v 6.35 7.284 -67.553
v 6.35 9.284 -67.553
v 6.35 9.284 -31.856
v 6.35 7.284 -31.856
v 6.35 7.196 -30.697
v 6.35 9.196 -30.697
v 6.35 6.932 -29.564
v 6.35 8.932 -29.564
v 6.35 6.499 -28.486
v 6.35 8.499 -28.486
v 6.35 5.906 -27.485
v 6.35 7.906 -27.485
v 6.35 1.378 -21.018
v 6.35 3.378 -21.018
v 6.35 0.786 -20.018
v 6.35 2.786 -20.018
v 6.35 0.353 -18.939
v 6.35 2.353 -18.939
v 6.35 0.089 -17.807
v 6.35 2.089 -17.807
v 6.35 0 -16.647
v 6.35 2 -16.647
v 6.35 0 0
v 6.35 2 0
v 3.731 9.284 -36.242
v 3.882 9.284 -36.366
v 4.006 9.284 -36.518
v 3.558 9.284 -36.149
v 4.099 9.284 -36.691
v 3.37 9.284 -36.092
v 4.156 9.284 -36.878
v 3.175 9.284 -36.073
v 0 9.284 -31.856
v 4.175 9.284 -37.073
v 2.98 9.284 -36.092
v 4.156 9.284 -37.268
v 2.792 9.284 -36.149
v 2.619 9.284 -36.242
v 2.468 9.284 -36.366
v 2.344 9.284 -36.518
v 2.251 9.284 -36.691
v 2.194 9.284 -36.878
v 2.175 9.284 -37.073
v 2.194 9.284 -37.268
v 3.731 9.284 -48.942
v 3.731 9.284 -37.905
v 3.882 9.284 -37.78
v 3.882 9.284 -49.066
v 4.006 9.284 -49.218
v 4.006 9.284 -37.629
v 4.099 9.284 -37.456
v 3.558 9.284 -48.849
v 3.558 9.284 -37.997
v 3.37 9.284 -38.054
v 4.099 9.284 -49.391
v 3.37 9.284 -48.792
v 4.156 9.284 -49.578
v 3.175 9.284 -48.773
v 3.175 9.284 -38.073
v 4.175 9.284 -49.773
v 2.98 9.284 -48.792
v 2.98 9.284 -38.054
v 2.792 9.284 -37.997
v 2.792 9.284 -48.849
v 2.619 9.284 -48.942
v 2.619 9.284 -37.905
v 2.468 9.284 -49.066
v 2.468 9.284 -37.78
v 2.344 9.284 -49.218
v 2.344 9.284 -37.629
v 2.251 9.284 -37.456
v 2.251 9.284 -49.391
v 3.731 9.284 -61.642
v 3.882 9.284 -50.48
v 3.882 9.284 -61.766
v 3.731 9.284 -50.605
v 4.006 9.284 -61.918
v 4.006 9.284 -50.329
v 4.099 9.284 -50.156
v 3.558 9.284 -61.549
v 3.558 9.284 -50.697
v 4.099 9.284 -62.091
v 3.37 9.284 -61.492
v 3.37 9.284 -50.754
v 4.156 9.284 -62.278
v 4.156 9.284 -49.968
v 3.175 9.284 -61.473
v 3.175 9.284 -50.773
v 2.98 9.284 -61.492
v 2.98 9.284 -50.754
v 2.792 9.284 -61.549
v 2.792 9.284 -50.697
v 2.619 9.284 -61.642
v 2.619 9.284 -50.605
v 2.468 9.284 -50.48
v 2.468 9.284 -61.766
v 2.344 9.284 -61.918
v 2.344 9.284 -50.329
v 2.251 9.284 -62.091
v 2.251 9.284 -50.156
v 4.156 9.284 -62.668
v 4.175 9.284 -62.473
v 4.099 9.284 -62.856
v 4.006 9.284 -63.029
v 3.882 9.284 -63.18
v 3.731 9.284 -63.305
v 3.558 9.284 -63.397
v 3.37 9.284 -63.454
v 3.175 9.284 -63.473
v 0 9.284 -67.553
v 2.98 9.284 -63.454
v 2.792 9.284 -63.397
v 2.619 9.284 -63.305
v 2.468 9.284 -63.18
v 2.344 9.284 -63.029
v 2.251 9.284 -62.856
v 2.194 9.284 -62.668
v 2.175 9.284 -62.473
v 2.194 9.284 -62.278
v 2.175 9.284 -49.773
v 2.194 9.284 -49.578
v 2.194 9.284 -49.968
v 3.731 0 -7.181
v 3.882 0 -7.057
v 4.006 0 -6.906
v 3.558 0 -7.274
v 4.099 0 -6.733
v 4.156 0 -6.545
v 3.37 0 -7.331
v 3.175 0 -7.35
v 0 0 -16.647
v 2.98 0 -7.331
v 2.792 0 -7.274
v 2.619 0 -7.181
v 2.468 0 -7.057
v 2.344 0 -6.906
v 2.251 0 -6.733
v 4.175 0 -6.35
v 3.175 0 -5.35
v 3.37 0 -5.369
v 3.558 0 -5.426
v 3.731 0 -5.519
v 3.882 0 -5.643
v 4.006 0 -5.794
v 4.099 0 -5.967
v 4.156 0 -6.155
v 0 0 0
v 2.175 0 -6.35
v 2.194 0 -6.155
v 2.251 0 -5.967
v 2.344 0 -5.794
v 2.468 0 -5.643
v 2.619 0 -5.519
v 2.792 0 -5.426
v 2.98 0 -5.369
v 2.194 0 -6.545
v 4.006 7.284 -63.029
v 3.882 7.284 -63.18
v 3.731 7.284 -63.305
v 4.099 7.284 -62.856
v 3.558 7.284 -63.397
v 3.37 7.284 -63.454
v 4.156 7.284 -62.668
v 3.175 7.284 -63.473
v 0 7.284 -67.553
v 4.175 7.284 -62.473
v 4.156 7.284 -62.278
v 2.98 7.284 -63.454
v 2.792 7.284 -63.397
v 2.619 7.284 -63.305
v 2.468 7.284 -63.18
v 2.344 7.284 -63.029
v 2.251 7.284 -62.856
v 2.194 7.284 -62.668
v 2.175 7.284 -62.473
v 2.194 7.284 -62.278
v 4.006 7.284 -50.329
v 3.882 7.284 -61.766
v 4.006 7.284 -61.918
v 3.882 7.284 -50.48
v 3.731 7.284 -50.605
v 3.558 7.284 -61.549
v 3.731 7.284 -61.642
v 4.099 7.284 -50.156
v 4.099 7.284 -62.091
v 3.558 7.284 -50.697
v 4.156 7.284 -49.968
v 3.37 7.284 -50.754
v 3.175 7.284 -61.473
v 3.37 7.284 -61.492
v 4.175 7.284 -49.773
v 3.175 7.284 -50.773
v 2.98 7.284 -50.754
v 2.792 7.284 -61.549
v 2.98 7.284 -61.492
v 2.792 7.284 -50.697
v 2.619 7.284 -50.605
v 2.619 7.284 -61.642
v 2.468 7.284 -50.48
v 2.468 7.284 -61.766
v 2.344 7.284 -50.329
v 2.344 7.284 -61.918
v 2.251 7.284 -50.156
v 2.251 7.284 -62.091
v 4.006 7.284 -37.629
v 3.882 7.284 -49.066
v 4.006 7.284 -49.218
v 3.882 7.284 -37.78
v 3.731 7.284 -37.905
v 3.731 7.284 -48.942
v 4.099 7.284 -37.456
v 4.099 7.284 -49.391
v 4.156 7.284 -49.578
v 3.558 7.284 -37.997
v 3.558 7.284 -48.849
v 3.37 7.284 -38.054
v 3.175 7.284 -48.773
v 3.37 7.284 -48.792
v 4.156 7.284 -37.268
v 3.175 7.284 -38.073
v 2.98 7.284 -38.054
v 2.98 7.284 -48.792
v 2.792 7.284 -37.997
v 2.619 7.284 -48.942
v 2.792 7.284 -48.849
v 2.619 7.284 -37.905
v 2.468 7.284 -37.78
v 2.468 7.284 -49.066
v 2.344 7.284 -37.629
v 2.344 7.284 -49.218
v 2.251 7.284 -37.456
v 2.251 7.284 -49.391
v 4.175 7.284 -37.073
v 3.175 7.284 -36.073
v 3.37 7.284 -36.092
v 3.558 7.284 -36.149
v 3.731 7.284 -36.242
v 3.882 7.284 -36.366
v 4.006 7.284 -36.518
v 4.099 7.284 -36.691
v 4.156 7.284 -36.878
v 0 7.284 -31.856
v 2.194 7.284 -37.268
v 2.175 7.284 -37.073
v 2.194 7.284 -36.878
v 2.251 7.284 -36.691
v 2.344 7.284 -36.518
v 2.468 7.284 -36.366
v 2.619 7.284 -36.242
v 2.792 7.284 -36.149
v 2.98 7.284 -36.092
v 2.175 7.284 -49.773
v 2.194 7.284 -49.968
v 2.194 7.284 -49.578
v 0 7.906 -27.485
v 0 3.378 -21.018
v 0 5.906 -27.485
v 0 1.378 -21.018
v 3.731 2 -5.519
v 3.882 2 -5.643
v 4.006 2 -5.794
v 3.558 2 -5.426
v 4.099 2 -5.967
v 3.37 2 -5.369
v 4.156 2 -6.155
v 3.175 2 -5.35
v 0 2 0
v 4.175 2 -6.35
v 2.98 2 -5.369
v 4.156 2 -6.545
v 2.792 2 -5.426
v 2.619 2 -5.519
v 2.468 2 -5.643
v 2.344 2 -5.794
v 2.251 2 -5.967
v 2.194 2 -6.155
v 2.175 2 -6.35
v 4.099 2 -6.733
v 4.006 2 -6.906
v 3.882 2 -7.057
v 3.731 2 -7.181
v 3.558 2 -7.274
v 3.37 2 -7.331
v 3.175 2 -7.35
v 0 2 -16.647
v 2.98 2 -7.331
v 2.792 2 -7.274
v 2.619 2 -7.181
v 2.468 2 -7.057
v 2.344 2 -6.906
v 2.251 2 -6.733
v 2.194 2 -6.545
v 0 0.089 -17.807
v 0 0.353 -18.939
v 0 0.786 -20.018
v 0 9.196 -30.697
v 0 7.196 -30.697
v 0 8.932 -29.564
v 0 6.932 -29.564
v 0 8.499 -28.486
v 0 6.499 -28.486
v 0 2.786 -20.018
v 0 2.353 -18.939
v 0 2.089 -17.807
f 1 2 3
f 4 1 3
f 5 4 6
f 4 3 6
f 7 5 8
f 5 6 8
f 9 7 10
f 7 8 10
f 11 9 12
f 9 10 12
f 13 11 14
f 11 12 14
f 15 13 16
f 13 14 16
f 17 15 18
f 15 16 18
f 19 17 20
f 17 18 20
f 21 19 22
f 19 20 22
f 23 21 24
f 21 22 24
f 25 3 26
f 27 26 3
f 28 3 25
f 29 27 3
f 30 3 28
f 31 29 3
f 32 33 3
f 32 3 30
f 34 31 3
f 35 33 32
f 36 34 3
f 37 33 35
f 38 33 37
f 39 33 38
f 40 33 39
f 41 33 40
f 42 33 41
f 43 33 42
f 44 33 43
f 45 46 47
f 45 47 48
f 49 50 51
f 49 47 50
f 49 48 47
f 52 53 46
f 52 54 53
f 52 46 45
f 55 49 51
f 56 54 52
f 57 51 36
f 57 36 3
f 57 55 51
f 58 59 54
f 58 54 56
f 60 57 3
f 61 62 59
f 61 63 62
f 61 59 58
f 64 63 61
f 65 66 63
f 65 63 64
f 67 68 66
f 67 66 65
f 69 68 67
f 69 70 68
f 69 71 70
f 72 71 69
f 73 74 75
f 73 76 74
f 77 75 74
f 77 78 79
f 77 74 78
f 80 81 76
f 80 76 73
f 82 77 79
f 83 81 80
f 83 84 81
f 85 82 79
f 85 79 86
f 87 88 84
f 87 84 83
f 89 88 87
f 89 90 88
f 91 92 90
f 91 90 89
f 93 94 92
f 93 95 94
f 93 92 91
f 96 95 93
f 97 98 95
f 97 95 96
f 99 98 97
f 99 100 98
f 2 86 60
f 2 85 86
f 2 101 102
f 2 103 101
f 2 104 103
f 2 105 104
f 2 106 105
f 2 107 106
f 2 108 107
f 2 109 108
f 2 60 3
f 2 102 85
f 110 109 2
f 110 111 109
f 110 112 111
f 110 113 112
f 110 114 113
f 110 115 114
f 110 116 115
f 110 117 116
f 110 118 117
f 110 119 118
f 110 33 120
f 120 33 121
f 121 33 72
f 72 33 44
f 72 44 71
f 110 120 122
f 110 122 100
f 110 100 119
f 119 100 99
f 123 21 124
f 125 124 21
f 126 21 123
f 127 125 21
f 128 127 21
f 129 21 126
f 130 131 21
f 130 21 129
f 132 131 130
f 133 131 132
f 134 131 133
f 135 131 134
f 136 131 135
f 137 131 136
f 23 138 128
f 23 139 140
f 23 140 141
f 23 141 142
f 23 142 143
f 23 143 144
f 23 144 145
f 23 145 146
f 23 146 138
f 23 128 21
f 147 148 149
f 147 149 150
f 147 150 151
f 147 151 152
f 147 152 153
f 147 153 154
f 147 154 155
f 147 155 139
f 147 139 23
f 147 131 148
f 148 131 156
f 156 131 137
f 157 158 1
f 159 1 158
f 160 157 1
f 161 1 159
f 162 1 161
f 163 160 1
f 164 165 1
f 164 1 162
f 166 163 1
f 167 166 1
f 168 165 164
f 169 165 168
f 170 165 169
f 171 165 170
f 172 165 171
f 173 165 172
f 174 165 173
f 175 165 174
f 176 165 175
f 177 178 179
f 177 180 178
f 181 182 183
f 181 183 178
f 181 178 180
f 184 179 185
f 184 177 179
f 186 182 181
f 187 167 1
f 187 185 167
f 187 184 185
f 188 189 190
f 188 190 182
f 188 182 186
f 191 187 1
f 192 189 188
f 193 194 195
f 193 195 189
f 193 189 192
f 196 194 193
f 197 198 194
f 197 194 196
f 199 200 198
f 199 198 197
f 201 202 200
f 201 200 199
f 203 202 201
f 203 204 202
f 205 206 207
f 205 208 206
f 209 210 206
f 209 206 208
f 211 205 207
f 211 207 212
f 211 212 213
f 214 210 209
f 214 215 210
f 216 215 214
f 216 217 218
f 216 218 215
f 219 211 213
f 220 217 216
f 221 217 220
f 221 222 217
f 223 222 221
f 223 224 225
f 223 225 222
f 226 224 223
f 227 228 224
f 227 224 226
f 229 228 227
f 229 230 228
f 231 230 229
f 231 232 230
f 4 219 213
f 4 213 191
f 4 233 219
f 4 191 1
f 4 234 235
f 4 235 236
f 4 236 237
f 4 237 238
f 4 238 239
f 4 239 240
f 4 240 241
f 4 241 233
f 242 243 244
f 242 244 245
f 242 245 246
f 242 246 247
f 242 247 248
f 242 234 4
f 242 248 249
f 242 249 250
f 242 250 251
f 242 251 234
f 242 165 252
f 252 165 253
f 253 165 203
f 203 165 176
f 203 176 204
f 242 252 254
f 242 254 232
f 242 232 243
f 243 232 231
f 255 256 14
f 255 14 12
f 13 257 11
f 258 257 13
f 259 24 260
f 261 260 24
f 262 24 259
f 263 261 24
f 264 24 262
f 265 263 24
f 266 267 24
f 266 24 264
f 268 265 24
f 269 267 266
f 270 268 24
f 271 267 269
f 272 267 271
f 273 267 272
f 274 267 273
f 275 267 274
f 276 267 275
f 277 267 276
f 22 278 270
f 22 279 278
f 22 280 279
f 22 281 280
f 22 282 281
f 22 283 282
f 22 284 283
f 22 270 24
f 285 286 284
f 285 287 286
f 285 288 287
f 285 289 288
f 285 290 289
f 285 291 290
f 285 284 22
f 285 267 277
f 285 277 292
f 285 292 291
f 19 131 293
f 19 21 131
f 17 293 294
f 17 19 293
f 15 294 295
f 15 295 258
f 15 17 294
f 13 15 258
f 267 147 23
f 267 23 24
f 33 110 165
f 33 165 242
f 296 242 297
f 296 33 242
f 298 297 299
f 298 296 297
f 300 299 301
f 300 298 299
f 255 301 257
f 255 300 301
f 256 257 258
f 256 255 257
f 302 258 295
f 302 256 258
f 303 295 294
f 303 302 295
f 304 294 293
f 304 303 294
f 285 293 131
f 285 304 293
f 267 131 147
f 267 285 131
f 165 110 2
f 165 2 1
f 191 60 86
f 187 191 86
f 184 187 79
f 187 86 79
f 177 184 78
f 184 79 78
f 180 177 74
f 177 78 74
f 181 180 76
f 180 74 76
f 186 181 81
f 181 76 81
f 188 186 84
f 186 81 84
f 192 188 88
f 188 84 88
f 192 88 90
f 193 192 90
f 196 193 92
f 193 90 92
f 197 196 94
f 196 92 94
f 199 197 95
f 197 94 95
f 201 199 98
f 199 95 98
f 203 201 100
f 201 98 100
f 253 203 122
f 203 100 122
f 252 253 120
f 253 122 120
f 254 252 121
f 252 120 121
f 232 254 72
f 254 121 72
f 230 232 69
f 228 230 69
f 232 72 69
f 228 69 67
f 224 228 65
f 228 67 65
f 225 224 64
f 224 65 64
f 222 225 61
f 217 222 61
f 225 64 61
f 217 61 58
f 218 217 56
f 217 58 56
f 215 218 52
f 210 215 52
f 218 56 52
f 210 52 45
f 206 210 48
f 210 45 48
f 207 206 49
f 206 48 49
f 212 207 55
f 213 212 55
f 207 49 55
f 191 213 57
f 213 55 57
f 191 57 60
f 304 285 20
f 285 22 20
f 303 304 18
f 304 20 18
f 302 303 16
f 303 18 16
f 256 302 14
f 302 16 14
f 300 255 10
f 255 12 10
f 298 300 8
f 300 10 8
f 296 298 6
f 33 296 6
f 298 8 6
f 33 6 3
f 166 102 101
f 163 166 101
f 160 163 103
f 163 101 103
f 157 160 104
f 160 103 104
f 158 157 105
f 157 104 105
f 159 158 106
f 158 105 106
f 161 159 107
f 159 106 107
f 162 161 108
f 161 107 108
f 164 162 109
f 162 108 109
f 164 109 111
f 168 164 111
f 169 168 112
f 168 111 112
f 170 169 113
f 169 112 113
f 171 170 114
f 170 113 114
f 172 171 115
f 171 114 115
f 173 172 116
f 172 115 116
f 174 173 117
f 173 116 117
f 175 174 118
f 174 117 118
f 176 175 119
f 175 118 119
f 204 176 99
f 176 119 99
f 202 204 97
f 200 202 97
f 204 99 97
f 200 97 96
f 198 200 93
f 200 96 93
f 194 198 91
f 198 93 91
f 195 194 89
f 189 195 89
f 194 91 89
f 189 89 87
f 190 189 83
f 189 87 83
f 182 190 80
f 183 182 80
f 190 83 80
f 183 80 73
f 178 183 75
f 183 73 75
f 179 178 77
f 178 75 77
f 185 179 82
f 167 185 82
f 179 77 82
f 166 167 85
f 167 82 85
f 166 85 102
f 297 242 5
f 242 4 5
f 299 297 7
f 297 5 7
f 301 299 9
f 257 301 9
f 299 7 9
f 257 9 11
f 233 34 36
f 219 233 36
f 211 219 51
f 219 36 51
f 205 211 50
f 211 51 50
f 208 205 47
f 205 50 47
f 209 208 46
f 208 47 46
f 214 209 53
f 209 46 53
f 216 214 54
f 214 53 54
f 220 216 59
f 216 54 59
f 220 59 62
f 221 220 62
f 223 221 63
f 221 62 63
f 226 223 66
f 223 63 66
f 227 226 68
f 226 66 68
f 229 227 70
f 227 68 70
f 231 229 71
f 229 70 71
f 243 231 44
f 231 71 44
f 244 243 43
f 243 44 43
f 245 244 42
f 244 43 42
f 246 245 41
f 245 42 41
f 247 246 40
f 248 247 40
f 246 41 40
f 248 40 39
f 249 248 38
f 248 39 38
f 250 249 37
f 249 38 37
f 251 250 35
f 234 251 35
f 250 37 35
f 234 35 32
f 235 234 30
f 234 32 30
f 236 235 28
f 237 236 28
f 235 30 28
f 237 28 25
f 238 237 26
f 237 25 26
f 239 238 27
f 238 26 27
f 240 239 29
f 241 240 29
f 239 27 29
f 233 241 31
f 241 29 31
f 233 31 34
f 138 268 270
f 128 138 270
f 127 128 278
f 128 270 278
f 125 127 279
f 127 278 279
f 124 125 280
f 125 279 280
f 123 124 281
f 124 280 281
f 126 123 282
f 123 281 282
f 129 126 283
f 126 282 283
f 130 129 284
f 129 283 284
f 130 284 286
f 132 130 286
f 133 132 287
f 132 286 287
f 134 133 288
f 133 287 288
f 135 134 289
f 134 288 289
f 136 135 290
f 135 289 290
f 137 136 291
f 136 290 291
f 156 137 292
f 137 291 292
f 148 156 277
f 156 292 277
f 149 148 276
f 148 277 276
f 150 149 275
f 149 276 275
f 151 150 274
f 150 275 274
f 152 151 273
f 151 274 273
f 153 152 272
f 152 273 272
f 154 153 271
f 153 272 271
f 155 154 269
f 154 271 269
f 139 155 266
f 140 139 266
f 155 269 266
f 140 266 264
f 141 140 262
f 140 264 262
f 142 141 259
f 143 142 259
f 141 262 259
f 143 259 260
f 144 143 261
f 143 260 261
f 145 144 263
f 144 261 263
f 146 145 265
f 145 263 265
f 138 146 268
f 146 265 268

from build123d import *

# Parameters (mm, degrees)
BOSS_EXTRUDE1_DEPTH = 6.35
SKETCH2_R           = 1
CUT_EXTRUDE1_DEPTH  = 2
SKETCH3_R           = 1
CUT_EXTRUDE2_DEPTH  = 2
LPATTERN1_COUNT     = 3
LPATTERN1_PITCH     = 12.7
FILLET1_R           = 7.62


with BuildPart() as part:
    # Sketch1 → Boss-Extrude1 (new body)
    with BuildSketch(Plane(origin=(0, 0, 0), x_dir=(0, 0, -1), z_dir=(1, 0, 0))):
        Polygon((0, 2), (19.05, 2), (29.453230962, 9.284420742), (67.553230962, 9.284420742), (67.553230962, 7.284420742), (29.453230962, 7.284420742), (19.05, 0), (0, 0), align=None)
    extrude(amount=BOSS_EXTRUDE1_DEPTH)

    # Sketch2 → Cut-Extrude1 (cut)
    with BuildSketch(Plane(origin=(0, 2, 0), x_dir=(1, 0, 0), z_dir=(0, 1, 0))):
        with Locations((3.175, 6.35)):
            Circle(SKETCH2_R)
    extrude(amount=-CUT_EXTRUDE1_DEPTH, mode=Mode.SUBTRACT)

    # Sketch3 → Cut-Extrude2 (cut)
    with BuildSketch(Plane(origin=(0, 9.284420742, 0), x_dir=(1, 0, 0), z_dir=(0, 1, 0))):
        with Locations((3.175, 62.473230962)):
            Circle(SKETCH3_R)
    cut_extrude2 = extrude(amount=-CUT_EXTRUDE2_DEPTH, mode=Mode.SUBTRACT)

    # LPattern1: Cut-Extrude2 ×3
    with Locations(*[(0, 0, i * LPATTERN1_PITCH) for i in range(1, LPATTERN1_COUNT)]):
        add(cut_extrude2, mode=Mode.SUBTRACT)

    # Fillet1
    fillet1_edges = [part.edges().sort_by_distance(p)[0] for p in [
        (3.175, 2, -19.05),
        (3.175, 9.284420742, -29.453230962),
        (3.175, 7.284420742, -29.453230962),
        (3.175, 0, -19.05),
    ]]
    fillet(fillet1_edges, radius=FILLET1_R)


solid = part.part
